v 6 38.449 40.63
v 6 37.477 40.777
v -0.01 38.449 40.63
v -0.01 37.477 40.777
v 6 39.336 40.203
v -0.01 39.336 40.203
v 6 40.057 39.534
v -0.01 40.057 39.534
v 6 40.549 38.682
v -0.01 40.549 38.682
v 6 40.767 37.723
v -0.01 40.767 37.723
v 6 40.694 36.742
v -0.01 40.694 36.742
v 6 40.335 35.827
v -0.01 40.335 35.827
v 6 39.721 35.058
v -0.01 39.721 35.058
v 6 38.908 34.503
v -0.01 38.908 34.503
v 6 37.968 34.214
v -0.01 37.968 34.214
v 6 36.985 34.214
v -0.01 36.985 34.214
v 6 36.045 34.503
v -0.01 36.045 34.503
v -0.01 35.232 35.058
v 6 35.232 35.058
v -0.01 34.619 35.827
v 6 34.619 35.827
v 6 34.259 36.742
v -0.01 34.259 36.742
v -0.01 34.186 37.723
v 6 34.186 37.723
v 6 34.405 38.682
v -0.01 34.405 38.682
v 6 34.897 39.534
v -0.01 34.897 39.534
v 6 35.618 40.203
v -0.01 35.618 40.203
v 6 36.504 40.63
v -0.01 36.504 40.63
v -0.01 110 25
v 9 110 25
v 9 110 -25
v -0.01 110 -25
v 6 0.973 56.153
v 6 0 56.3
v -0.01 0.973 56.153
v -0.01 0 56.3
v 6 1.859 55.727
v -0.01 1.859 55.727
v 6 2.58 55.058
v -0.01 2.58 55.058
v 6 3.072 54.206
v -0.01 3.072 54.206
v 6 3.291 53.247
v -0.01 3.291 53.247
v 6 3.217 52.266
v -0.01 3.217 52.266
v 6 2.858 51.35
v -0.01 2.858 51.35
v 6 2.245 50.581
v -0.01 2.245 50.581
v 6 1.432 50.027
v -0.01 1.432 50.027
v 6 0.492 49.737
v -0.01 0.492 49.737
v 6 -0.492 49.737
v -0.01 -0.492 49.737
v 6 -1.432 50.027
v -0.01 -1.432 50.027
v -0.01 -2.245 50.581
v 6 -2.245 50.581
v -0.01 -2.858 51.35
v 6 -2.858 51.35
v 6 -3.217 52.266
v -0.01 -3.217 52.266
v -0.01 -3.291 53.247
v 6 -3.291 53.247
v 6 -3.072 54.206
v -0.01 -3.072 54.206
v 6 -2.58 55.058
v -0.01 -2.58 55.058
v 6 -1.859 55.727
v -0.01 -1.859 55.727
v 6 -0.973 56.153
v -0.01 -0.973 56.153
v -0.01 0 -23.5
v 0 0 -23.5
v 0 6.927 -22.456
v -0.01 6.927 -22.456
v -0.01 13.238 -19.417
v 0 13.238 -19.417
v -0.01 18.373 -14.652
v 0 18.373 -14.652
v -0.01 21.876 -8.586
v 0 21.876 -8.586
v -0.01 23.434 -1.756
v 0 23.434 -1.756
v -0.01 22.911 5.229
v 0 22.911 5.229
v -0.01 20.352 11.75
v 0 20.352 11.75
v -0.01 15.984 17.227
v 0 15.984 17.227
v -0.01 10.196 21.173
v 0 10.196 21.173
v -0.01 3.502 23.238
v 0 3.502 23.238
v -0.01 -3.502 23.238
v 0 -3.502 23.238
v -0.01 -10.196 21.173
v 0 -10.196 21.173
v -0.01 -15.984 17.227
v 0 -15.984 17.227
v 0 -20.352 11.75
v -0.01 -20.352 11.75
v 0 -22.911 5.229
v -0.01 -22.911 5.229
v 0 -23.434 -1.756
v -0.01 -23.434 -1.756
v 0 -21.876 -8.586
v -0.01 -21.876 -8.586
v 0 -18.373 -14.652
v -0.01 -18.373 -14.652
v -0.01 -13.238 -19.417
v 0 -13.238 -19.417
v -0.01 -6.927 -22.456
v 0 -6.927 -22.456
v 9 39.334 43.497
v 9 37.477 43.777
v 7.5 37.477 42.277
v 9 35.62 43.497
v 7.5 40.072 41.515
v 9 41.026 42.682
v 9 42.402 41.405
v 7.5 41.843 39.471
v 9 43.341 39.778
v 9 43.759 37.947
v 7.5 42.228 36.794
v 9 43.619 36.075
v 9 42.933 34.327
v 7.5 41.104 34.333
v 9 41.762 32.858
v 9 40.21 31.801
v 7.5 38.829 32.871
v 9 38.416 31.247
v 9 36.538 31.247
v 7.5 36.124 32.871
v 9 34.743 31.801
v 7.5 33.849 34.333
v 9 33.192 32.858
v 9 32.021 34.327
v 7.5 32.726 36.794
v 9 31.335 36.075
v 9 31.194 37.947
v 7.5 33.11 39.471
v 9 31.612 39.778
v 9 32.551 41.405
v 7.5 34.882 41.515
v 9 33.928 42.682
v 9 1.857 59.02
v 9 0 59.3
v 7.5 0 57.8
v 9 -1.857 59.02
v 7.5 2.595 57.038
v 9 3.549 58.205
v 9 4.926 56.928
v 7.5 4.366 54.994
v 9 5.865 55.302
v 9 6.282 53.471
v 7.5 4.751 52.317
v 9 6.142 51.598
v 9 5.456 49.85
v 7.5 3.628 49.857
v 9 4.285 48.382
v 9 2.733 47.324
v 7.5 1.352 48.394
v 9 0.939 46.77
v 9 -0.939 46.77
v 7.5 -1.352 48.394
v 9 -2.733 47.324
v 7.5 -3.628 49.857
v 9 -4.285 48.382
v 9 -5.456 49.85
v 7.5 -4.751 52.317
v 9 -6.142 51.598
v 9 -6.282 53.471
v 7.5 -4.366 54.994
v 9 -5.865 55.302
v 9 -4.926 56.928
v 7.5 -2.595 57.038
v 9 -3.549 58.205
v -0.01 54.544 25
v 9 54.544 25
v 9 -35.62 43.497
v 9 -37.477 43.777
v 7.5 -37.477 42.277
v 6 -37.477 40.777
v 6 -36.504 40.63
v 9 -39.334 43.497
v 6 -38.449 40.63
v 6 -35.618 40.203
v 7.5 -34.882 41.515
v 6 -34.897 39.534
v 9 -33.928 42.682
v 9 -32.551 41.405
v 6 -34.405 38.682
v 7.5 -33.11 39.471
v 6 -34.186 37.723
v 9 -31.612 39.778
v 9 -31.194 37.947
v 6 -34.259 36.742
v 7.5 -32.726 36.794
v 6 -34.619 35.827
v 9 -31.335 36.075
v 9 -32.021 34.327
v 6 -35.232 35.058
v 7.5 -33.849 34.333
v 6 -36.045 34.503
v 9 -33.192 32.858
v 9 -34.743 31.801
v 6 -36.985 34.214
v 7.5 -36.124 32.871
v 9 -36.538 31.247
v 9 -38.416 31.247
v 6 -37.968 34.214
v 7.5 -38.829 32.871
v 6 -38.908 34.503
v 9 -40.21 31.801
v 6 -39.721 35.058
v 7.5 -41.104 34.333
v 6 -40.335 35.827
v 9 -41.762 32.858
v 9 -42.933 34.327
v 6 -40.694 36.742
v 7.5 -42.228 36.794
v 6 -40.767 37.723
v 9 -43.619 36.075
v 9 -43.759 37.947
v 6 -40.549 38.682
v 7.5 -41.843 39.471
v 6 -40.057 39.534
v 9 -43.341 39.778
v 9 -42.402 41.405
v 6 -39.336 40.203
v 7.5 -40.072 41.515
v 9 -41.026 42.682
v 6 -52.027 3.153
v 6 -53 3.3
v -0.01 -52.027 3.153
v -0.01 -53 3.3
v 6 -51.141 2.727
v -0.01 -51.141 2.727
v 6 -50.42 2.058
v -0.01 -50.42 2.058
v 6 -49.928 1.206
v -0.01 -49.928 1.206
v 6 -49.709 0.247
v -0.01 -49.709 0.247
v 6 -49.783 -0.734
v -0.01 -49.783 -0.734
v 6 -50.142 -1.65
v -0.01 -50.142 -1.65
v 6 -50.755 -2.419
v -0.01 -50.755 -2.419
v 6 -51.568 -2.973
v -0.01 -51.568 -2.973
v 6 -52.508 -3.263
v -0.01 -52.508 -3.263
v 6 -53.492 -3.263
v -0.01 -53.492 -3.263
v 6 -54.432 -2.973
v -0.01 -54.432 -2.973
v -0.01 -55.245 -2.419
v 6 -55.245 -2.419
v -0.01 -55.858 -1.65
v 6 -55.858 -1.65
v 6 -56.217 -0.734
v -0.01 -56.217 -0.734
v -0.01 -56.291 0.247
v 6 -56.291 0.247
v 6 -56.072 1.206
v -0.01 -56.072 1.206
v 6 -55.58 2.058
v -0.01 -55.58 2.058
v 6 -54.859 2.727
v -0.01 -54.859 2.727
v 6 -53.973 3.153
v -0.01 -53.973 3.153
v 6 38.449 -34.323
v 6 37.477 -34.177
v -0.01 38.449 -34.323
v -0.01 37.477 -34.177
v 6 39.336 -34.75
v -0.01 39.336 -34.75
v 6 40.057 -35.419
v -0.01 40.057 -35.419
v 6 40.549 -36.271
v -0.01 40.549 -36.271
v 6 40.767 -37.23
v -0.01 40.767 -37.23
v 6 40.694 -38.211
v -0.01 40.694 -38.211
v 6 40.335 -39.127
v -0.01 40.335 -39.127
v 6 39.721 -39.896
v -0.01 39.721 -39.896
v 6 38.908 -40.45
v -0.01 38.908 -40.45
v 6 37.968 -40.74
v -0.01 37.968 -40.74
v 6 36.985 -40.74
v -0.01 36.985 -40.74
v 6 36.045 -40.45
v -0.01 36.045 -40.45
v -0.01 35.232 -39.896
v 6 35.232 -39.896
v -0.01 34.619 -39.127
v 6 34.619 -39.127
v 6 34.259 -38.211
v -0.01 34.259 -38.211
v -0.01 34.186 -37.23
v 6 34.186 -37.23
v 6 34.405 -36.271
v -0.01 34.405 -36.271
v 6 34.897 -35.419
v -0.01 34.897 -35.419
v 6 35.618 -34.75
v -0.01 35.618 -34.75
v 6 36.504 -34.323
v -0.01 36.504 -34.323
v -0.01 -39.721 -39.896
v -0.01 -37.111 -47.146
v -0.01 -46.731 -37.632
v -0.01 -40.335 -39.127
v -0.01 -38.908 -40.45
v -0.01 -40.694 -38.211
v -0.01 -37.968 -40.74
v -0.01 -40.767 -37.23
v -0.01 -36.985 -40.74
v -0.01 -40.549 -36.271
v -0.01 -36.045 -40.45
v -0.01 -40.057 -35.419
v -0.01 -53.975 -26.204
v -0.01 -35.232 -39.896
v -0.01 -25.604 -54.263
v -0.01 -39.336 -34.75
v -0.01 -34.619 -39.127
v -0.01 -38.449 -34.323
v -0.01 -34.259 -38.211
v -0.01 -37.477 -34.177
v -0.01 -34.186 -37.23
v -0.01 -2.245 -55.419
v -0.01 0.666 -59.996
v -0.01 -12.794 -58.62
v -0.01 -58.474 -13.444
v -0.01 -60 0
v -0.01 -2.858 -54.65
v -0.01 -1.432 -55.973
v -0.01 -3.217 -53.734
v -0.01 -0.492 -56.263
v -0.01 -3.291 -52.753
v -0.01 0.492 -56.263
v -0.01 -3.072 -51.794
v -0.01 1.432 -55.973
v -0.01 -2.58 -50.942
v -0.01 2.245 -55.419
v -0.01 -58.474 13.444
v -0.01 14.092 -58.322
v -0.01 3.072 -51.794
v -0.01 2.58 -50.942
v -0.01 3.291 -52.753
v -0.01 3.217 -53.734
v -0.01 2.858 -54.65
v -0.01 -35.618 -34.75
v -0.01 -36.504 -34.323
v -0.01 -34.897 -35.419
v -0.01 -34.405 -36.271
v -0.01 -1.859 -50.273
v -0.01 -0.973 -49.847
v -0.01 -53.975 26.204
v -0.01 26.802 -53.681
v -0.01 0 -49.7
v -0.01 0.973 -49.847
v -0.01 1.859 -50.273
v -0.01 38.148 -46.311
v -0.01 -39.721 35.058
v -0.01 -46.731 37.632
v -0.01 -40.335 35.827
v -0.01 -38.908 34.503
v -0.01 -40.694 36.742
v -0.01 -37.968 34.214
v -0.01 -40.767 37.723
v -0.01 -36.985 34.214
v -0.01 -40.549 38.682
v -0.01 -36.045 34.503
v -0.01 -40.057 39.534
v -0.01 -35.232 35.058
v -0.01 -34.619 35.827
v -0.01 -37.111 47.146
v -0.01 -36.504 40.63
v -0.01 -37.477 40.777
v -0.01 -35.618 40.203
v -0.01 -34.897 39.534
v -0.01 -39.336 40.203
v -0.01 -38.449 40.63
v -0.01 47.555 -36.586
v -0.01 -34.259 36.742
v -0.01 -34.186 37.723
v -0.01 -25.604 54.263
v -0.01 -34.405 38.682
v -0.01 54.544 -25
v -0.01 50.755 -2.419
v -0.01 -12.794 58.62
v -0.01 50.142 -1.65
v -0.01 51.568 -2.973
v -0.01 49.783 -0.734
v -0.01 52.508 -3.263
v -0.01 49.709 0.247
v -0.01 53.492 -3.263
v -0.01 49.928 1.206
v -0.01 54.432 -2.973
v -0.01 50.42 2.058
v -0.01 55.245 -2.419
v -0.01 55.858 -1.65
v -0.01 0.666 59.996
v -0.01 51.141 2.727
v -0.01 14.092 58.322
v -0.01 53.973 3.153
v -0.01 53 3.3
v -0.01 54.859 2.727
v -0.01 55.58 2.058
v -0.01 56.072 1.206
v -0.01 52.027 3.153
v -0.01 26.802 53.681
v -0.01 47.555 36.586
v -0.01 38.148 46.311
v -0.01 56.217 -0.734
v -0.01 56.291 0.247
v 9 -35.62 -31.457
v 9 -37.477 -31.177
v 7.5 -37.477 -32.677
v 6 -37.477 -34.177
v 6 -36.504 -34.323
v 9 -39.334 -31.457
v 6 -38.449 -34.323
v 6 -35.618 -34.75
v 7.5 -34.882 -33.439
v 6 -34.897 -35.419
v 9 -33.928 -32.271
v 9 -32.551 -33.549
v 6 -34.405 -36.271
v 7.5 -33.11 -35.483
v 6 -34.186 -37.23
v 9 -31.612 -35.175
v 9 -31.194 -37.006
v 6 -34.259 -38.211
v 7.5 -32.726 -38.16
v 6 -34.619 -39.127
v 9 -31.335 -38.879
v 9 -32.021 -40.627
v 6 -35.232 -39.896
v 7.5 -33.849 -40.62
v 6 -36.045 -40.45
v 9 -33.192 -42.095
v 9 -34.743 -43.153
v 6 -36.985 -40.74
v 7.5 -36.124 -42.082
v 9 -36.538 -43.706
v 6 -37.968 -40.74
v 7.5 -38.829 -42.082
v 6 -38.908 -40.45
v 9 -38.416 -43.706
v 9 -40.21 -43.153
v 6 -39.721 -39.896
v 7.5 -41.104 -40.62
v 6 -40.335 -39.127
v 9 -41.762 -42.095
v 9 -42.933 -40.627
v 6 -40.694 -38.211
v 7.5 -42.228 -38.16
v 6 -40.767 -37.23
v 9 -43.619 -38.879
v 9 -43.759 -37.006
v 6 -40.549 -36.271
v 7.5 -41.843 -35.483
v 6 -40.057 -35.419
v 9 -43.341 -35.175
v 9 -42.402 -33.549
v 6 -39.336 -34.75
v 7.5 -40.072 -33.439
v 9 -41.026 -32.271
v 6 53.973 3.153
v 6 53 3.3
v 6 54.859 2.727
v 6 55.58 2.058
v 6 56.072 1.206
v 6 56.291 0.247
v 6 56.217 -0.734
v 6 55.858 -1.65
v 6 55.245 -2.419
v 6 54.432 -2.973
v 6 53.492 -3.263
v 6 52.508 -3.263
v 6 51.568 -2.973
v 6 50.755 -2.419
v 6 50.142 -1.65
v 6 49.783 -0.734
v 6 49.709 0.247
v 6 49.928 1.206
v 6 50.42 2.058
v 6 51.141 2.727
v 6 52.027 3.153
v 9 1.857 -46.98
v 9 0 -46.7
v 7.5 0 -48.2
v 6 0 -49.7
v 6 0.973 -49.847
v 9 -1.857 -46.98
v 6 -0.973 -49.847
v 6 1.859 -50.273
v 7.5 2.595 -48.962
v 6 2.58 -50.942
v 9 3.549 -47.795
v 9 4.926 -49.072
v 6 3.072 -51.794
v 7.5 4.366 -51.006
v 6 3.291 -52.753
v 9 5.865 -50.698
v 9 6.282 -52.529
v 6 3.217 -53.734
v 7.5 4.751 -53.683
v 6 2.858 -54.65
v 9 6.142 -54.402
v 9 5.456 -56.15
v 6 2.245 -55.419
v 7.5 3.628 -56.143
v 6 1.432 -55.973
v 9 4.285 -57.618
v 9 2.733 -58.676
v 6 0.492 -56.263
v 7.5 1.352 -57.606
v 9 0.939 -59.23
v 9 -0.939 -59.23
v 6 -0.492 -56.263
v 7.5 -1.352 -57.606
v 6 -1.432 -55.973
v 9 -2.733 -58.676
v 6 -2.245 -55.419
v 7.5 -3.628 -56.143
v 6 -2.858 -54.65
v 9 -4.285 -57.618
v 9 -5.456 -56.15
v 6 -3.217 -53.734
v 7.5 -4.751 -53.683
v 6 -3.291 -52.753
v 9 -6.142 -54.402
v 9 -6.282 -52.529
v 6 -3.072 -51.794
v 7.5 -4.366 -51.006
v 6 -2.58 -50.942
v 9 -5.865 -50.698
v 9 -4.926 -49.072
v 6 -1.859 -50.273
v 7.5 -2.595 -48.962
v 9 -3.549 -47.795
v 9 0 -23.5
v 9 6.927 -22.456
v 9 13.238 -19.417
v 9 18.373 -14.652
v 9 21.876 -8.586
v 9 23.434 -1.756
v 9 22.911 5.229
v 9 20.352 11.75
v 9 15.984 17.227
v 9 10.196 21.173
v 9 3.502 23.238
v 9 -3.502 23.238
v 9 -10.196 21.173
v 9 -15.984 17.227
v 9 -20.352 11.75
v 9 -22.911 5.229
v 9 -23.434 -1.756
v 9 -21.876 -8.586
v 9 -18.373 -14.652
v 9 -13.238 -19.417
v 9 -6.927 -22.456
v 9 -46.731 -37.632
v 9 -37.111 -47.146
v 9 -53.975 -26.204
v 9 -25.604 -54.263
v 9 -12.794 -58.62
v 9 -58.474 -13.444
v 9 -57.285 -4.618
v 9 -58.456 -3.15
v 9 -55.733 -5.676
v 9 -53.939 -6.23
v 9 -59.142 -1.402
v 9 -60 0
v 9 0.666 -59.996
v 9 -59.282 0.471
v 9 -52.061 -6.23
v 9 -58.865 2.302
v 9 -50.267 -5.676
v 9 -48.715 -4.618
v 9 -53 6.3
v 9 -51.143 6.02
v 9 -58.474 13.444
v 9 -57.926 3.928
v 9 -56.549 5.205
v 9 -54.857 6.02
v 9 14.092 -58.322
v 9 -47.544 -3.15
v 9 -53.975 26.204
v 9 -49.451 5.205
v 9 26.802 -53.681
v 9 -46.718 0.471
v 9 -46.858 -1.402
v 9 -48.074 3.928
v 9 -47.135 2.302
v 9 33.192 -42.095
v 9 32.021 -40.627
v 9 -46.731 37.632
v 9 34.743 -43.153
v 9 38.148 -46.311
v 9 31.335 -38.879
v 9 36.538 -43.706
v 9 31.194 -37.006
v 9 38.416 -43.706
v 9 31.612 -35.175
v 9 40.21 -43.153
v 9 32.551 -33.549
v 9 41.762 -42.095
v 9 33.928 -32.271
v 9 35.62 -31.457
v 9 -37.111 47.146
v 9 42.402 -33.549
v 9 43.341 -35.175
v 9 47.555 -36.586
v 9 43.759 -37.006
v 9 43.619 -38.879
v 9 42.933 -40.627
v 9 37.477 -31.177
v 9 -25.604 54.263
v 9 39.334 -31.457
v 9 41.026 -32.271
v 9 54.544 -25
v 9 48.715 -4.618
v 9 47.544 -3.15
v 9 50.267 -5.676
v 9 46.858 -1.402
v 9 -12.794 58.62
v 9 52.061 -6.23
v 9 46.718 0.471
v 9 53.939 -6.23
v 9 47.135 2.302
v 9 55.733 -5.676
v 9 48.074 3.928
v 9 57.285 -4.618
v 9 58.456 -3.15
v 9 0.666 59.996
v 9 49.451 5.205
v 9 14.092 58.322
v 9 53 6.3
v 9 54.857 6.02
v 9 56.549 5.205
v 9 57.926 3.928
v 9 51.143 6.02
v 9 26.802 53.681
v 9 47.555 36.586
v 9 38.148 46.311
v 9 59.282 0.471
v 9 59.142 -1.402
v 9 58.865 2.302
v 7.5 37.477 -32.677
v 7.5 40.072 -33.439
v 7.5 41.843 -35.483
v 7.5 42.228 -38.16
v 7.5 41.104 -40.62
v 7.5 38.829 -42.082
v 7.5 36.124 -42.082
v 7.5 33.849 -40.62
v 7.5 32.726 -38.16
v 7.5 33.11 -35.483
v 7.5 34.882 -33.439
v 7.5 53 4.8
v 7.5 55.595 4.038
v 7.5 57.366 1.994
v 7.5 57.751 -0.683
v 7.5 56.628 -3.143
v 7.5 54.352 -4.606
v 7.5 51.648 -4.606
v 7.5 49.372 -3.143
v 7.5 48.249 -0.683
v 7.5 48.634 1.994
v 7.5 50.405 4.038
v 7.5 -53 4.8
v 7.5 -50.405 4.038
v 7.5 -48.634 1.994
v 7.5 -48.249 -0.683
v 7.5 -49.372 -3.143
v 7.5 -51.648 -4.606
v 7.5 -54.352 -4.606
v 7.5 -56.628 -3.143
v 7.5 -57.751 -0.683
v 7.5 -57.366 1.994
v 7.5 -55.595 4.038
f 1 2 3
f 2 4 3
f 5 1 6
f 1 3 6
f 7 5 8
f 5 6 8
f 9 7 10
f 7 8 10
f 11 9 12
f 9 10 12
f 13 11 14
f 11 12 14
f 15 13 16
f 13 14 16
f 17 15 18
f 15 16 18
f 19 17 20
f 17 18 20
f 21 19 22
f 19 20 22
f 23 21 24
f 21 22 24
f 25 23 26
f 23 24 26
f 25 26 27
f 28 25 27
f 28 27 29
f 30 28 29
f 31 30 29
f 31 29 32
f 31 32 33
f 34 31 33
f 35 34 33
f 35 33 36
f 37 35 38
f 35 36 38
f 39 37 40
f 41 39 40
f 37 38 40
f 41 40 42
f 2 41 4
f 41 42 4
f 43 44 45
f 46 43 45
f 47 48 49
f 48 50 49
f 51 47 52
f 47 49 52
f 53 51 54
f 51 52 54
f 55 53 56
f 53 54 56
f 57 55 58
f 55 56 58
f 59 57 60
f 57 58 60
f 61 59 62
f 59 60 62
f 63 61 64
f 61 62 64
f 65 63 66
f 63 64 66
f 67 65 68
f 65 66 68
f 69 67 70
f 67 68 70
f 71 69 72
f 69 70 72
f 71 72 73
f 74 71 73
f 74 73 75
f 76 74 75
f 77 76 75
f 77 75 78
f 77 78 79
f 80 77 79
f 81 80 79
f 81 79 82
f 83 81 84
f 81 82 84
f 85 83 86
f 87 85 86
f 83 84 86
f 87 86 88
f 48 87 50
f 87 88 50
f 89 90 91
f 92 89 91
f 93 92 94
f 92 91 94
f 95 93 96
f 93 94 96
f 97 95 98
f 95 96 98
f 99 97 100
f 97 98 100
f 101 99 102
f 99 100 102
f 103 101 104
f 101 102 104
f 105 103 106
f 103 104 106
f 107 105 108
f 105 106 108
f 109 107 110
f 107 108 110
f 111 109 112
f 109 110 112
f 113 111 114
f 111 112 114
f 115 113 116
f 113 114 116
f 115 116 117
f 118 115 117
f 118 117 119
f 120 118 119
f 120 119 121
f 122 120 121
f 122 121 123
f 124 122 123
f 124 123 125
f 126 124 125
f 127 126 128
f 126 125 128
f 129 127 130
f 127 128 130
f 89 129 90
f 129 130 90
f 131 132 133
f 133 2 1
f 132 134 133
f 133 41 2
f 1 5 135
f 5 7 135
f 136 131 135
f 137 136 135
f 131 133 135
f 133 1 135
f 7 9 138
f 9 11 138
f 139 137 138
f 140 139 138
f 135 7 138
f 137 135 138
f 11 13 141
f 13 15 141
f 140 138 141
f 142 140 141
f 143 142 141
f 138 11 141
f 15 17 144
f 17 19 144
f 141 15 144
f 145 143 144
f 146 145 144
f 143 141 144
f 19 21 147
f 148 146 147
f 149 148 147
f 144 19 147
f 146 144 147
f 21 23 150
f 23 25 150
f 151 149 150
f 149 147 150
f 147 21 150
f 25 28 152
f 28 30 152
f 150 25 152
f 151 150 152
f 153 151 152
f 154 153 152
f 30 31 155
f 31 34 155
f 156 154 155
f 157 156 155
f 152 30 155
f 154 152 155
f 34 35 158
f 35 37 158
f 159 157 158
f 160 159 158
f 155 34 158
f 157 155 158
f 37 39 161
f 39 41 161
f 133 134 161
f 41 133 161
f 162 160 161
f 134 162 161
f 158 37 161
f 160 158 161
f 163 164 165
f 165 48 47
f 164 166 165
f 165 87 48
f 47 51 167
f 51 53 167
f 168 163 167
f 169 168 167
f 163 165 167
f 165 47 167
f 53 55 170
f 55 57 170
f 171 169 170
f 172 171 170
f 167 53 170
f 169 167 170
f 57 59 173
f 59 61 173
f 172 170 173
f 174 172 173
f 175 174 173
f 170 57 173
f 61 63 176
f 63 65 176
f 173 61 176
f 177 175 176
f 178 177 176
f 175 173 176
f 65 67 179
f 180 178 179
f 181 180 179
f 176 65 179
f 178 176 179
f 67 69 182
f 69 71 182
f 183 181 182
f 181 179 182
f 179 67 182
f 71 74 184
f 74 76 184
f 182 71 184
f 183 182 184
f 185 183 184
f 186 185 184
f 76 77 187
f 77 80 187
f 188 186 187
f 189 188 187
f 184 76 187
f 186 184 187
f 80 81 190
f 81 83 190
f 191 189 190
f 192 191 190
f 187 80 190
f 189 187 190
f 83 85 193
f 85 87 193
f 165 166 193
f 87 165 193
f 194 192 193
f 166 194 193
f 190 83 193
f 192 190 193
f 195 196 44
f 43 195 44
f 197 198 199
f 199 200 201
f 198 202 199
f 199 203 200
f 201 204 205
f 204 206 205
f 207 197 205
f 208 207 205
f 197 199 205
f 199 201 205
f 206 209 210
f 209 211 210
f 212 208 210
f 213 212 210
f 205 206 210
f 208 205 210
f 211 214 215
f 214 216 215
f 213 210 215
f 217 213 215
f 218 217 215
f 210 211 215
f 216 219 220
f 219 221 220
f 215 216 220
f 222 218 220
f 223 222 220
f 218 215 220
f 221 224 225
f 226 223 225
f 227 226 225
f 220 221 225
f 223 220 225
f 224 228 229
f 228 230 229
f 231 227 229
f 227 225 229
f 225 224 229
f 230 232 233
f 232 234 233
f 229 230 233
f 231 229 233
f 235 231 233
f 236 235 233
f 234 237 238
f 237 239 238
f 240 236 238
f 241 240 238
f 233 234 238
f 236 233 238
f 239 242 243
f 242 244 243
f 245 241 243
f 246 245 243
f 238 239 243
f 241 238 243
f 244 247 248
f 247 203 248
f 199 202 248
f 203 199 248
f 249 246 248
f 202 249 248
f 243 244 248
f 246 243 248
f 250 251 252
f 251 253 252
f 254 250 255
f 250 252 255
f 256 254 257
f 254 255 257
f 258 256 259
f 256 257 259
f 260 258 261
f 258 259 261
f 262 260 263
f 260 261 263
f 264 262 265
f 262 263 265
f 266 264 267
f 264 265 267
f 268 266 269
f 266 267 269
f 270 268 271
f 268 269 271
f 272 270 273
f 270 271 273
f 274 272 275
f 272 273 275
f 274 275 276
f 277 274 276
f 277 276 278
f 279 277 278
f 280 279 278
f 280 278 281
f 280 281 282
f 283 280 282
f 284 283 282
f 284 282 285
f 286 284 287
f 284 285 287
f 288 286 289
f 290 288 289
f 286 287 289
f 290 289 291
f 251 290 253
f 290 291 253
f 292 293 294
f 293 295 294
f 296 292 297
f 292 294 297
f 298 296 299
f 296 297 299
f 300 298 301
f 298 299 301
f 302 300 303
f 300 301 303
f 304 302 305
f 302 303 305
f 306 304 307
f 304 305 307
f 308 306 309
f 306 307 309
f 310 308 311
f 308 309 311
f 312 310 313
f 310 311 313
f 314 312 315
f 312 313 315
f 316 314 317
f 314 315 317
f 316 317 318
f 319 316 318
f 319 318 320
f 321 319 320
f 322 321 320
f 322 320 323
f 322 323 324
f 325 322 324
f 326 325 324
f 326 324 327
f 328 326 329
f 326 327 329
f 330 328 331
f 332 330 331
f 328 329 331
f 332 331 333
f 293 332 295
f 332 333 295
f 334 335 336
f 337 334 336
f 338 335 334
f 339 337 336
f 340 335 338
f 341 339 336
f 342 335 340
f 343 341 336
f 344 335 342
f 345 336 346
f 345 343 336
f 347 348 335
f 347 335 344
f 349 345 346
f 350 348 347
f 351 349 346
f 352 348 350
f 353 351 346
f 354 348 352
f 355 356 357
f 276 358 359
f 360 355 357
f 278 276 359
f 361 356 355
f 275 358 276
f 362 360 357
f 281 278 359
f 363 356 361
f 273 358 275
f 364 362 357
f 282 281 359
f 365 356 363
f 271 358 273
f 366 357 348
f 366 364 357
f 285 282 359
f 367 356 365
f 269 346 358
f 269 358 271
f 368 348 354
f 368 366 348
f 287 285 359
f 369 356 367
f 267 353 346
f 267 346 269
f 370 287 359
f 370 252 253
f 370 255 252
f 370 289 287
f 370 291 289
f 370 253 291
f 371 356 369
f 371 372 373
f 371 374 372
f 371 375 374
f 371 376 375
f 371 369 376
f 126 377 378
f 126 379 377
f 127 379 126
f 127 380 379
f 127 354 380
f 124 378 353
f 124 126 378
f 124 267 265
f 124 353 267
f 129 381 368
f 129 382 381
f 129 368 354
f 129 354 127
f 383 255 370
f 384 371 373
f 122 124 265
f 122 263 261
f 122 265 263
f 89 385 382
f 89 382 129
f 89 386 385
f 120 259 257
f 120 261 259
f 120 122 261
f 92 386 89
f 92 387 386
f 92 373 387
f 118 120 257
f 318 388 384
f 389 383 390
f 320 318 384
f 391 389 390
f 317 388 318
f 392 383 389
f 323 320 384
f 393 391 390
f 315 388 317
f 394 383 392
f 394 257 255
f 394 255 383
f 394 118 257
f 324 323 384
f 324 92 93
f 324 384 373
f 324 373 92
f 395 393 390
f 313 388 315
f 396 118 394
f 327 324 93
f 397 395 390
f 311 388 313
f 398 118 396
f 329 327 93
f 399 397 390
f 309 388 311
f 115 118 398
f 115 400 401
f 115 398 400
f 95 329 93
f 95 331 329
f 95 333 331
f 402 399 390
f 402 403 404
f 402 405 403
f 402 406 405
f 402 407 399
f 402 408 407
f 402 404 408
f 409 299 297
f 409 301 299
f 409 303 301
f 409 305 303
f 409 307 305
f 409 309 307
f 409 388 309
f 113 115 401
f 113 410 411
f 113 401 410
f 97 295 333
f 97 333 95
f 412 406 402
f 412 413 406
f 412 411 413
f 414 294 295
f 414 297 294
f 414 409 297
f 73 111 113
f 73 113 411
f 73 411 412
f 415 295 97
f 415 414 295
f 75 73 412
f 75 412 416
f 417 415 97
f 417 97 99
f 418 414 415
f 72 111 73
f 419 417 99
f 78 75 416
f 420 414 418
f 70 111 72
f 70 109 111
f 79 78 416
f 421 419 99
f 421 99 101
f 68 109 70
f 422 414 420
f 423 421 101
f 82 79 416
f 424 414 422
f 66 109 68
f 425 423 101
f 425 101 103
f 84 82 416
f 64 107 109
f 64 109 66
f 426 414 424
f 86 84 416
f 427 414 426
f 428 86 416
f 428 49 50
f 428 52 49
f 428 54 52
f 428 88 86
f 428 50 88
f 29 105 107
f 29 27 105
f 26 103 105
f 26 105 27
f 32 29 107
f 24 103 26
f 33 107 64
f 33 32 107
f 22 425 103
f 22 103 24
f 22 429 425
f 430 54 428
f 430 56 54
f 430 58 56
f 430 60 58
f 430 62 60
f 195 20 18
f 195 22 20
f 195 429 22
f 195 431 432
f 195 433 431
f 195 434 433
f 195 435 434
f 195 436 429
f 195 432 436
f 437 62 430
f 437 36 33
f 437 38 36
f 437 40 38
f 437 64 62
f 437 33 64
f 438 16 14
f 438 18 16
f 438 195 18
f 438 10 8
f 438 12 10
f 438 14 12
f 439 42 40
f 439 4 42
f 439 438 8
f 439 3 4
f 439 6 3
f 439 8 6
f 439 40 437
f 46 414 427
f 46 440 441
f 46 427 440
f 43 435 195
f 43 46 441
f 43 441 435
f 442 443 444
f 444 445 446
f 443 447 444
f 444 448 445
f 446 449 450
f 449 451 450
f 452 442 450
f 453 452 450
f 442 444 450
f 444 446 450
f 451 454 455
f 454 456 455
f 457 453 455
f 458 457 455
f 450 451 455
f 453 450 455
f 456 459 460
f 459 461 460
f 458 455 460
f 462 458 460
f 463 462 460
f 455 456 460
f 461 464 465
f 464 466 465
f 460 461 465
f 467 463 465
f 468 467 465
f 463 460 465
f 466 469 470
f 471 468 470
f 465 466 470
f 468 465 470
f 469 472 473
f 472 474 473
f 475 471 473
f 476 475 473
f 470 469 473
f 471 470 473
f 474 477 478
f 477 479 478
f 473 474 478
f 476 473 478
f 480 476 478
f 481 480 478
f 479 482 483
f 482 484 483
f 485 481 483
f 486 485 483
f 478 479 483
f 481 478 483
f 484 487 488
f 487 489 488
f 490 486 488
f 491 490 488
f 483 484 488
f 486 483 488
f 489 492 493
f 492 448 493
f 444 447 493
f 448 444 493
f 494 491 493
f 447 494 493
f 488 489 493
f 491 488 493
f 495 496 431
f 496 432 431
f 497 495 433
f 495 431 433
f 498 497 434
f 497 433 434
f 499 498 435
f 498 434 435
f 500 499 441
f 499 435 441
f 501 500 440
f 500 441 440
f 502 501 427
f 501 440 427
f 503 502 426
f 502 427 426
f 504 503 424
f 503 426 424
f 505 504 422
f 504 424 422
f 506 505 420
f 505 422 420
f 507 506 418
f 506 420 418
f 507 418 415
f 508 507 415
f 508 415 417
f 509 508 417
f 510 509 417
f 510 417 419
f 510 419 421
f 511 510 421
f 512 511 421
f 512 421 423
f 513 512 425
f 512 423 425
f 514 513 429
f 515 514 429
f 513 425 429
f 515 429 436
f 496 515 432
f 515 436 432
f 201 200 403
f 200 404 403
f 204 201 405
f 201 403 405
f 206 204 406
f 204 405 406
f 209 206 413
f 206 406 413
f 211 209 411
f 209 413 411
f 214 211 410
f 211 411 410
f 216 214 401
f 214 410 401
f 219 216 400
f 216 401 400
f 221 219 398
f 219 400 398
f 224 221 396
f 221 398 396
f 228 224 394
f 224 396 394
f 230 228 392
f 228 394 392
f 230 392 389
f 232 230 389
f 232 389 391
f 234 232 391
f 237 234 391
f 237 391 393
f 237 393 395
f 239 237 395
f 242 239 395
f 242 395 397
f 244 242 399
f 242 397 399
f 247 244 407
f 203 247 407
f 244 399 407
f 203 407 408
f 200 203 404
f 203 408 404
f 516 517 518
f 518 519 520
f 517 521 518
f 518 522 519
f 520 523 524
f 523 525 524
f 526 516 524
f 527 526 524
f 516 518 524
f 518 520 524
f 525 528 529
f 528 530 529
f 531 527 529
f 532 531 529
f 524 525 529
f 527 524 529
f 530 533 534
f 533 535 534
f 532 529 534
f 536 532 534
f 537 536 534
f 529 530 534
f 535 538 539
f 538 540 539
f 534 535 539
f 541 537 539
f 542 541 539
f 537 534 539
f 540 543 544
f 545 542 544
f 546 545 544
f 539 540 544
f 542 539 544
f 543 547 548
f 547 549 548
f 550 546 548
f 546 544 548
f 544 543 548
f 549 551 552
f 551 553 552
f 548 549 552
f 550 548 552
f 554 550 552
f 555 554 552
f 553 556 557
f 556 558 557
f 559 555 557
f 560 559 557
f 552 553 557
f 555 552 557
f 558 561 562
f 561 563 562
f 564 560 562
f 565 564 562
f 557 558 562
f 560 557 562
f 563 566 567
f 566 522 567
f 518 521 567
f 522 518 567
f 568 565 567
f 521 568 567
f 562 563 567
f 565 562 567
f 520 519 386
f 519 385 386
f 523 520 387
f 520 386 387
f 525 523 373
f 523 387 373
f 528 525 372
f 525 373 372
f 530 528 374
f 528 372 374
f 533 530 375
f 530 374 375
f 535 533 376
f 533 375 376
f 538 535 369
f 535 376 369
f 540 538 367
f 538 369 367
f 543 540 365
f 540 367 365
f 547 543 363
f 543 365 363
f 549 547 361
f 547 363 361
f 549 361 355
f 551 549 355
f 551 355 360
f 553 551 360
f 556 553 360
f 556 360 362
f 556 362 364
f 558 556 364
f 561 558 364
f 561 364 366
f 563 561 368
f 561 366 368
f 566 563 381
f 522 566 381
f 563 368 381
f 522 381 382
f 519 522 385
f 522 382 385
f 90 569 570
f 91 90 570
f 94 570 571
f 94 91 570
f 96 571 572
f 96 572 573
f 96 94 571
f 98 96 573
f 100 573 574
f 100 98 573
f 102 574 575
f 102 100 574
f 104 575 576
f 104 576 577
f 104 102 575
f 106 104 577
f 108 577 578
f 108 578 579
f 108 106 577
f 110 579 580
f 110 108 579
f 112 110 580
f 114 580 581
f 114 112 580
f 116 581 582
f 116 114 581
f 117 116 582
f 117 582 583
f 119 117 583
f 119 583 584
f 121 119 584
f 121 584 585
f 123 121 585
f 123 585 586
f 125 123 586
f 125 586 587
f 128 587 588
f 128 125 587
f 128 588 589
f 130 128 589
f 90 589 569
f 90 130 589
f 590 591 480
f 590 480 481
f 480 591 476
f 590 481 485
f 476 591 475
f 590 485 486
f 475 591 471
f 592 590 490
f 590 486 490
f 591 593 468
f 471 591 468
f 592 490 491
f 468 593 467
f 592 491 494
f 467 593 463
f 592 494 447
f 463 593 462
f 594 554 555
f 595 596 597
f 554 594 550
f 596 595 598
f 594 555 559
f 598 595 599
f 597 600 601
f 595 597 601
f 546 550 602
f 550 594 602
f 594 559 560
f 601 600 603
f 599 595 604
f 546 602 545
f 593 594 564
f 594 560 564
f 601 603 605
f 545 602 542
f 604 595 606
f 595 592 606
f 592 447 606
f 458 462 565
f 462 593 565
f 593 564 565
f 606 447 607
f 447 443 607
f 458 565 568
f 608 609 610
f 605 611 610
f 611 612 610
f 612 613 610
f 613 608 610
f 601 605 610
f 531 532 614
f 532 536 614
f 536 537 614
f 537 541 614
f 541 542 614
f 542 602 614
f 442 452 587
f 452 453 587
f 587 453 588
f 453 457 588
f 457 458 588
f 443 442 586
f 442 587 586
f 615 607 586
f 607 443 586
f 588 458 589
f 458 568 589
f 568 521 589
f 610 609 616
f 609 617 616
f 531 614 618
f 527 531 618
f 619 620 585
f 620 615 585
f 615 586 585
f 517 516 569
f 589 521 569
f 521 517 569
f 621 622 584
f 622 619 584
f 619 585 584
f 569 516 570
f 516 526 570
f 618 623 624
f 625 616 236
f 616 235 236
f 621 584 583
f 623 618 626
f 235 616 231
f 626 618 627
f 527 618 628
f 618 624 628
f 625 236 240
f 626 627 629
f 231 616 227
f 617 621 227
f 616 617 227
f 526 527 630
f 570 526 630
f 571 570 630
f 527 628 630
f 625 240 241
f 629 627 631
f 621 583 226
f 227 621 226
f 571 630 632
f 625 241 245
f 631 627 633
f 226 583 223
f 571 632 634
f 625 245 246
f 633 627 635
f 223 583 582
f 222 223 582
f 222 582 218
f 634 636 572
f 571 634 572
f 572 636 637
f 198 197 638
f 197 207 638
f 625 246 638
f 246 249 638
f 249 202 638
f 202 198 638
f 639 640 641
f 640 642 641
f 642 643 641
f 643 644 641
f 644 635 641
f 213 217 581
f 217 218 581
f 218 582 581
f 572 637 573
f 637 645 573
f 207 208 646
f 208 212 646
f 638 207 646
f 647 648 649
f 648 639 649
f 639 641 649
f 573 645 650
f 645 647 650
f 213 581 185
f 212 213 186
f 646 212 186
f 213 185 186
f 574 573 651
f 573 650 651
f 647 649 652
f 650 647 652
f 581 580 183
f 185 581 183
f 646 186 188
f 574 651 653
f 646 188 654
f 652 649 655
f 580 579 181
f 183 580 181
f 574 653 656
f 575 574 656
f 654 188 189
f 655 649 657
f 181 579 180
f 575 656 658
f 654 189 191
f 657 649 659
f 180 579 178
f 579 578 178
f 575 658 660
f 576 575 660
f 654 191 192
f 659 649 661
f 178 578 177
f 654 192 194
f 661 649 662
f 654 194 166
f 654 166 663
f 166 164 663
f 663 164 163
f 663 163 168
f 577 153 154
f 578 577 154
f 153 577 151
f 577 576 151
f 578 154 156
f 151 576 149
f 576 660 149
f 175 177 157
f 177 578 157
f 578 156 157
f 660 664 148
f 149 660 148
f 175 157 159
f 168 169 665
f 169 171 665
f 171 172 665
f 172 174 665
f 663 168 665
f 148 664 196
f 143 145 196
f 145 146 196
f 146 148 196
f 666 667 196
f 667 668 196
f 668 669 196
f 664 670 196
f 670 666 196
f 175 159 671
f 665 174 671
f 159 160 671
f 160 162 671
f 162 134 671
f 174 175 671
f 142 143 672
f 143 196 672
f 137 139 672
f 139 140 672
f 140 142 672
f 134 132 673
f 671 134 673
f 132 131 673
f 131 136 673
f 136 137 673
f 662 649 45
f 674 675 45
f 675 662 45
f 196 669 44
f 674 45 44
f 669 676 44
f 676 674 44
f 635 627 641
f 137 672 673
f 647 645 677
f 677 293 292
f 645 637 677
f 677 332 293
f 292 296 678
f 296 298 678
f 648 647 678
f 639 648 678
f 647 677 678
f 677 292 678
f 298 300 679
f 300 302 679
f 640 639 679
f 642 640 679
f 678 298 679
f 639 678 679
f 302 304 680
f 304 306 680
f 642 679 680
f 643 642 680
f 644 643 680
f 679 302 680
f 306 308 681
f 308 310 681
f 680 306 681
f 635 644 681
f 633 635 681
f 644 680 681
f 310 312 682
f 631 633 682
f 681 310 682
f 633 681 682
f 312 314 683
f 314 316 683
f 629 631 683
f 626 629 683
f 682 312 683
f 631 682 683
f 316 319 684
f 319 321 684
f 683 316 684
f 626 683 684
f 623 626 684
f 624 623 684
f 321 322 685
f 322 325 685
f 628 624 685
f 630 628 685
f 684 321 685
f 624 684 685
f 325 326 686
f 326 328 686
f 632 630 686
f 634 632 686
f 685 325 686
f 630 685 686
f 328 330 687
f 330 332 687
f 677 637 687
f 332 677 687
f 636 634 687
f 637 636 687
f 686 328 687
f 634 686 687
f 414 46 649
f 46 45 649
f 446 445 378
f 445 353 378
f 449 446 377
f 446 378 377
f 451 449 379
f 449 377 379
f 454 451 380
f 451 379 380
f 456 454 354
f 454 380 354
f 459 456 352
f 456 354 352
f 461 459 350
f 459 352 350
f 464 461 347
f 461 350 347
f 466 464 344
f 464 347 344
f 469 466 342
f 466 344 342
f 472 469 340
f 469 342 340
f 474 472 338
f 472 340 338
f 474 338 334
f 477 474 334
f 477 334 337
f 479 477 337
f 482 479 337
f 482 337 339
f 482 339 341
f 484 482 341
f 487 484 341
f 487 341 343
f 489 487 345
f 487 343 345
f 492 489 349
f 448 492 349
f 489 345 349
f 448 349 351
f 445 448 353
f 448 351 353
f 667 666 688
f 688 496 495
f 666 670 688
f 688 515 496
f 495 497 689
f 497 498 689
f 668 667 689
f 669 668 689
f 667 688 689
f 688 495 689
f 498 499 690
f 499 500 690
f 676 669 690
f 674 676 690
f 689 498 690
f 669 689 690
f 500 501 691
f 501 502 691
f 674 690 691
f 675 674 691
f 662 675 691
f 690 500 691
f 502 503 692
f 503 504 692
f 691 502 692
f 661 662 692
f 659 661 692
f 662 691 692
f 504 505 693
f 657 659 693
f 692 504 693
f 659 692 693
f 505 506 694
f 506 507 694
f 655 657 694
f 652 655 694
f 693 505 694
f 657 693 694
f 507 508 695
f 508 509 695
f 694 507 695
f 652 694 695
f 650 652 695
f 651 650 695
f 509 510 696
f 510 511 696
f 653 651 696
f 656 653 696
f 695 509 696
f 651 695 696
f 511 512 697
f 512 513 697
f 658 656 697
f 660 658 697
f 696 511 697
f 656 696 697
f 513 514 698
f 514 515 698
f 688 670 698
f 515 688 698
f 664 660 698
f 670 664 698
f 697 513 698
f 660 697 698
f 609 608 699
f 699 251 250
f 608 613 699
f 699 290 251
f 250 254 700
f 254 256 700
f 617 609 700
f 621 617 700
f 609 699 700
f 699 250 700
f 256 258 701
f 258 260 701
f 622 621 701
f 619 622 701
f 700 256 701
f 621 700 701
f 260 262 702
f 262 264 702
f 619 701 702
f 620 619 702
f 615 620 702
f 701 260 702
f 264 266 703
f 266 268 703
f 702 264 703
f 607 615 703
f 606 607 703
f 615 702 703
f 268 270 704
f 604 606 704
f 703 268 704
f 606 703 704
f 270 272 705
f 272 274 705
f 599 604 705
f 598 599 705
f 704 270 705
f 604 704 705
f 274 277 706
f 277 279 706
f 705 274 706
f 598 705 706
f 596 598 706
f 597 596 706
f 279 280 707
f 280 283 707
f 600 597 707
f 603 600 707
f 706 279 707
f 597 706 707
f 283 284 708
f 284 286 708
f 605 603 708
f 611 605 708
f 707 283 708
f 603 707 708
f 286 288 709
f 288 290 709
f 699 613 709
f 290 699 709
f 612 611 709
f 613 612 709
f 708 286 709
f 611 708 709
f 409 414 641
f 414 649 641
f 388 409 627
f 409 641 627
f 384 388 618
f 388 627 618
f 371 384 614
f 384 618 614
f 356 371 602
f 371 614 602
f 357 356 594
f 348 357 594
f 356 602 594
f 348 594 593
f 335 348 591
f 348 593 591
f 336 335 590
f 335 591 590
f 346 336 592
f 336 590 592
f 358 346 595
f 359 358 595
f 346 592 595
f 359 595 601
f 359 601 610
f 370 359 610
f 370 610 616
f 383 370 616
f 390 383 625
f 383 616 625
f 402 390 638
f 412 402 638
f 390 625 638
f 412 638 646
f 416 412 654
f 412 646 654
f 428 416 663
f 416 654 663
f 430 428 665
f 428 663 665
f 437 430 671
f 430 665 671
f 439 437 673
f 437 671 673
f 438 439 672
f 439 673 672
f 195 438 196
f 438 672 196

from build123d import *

# Parameters (mm, degrees)
SKETCH1_R                                           = 23.5
BOSS_EXTRUDE1_DEPTH                                 = 9
BOSS_EXTRUDE1_DEPTH_BACK                            = 0.01
CSK_FOR_M6_COUNTERSUNK_FLAT_HEAD_SCREW1_D           = 6.6
CSK_FOR_M6_COUNTERSUNK_FLAT_HEAD_SCREW1_CSINK_D     = 12.6
CSK_FOR_M6_COUNTERSUNK_FLAT_HEAD_SCREW1_CSINK_ANGLE = 90


with BuildPart() as part:
    # Sketch1 → Boss-Extrude1 (new body, two sides)
    with BuildSketch(Plane(origin=(0, 0, 0), x_dir=(0, 0, -1), z_dir=(1, 0, 0))) as boss_extrude1_sk:
        with BuildLine():
            Line((-25, 110), (25, 110))
            Line((25, 110), (25, 54.543560573))
            ThreePointArc((25, 54.543560573), (0, -60), (-25, 54.543560573))
            Line((-25, 54.543560573), (-25, 110))
        make_face()
        Circle(SKETCH1_R, mode=Mode.SUBTRACT)
    extrude(amount=BOSS_EXTRUDE1_DEPTH)
    extrude(boss_extrude1_sk.sketch, amount=-BOSS_EXTRUDE1_DEPTH_BACK)

    # CSK for M6 Countersunk Flat Head Screw1 (through all)
    with Locations(Plane(origin=(9, 0, 0), x_dir=(0, 0, -1), z_dir=(1, 0, 0))):
        with Locations((-37.476659403, 37.476659403), (0, 53), (37.476659403, 37.476659403), (53, 0), (37.476659403, -37.476659403), (0, -53), (-37.476659403, -37.476659403), (-53, 0)):
            CounterSinkHole(CSK_FOR_M6_COUNTERSUNK_FLAT_HEAD_SCREW1_D / 2, CSK_FOR_M6_COUNTERSUNK_FLAT_HEAD_SCREW1_CSINK_D / 2, counter_sink_angle=CSK_FOR_M6_COUNTERSUNK_FLAT_HEAD_SCREW1_CSINK_ANGLE)


solid = part.part
